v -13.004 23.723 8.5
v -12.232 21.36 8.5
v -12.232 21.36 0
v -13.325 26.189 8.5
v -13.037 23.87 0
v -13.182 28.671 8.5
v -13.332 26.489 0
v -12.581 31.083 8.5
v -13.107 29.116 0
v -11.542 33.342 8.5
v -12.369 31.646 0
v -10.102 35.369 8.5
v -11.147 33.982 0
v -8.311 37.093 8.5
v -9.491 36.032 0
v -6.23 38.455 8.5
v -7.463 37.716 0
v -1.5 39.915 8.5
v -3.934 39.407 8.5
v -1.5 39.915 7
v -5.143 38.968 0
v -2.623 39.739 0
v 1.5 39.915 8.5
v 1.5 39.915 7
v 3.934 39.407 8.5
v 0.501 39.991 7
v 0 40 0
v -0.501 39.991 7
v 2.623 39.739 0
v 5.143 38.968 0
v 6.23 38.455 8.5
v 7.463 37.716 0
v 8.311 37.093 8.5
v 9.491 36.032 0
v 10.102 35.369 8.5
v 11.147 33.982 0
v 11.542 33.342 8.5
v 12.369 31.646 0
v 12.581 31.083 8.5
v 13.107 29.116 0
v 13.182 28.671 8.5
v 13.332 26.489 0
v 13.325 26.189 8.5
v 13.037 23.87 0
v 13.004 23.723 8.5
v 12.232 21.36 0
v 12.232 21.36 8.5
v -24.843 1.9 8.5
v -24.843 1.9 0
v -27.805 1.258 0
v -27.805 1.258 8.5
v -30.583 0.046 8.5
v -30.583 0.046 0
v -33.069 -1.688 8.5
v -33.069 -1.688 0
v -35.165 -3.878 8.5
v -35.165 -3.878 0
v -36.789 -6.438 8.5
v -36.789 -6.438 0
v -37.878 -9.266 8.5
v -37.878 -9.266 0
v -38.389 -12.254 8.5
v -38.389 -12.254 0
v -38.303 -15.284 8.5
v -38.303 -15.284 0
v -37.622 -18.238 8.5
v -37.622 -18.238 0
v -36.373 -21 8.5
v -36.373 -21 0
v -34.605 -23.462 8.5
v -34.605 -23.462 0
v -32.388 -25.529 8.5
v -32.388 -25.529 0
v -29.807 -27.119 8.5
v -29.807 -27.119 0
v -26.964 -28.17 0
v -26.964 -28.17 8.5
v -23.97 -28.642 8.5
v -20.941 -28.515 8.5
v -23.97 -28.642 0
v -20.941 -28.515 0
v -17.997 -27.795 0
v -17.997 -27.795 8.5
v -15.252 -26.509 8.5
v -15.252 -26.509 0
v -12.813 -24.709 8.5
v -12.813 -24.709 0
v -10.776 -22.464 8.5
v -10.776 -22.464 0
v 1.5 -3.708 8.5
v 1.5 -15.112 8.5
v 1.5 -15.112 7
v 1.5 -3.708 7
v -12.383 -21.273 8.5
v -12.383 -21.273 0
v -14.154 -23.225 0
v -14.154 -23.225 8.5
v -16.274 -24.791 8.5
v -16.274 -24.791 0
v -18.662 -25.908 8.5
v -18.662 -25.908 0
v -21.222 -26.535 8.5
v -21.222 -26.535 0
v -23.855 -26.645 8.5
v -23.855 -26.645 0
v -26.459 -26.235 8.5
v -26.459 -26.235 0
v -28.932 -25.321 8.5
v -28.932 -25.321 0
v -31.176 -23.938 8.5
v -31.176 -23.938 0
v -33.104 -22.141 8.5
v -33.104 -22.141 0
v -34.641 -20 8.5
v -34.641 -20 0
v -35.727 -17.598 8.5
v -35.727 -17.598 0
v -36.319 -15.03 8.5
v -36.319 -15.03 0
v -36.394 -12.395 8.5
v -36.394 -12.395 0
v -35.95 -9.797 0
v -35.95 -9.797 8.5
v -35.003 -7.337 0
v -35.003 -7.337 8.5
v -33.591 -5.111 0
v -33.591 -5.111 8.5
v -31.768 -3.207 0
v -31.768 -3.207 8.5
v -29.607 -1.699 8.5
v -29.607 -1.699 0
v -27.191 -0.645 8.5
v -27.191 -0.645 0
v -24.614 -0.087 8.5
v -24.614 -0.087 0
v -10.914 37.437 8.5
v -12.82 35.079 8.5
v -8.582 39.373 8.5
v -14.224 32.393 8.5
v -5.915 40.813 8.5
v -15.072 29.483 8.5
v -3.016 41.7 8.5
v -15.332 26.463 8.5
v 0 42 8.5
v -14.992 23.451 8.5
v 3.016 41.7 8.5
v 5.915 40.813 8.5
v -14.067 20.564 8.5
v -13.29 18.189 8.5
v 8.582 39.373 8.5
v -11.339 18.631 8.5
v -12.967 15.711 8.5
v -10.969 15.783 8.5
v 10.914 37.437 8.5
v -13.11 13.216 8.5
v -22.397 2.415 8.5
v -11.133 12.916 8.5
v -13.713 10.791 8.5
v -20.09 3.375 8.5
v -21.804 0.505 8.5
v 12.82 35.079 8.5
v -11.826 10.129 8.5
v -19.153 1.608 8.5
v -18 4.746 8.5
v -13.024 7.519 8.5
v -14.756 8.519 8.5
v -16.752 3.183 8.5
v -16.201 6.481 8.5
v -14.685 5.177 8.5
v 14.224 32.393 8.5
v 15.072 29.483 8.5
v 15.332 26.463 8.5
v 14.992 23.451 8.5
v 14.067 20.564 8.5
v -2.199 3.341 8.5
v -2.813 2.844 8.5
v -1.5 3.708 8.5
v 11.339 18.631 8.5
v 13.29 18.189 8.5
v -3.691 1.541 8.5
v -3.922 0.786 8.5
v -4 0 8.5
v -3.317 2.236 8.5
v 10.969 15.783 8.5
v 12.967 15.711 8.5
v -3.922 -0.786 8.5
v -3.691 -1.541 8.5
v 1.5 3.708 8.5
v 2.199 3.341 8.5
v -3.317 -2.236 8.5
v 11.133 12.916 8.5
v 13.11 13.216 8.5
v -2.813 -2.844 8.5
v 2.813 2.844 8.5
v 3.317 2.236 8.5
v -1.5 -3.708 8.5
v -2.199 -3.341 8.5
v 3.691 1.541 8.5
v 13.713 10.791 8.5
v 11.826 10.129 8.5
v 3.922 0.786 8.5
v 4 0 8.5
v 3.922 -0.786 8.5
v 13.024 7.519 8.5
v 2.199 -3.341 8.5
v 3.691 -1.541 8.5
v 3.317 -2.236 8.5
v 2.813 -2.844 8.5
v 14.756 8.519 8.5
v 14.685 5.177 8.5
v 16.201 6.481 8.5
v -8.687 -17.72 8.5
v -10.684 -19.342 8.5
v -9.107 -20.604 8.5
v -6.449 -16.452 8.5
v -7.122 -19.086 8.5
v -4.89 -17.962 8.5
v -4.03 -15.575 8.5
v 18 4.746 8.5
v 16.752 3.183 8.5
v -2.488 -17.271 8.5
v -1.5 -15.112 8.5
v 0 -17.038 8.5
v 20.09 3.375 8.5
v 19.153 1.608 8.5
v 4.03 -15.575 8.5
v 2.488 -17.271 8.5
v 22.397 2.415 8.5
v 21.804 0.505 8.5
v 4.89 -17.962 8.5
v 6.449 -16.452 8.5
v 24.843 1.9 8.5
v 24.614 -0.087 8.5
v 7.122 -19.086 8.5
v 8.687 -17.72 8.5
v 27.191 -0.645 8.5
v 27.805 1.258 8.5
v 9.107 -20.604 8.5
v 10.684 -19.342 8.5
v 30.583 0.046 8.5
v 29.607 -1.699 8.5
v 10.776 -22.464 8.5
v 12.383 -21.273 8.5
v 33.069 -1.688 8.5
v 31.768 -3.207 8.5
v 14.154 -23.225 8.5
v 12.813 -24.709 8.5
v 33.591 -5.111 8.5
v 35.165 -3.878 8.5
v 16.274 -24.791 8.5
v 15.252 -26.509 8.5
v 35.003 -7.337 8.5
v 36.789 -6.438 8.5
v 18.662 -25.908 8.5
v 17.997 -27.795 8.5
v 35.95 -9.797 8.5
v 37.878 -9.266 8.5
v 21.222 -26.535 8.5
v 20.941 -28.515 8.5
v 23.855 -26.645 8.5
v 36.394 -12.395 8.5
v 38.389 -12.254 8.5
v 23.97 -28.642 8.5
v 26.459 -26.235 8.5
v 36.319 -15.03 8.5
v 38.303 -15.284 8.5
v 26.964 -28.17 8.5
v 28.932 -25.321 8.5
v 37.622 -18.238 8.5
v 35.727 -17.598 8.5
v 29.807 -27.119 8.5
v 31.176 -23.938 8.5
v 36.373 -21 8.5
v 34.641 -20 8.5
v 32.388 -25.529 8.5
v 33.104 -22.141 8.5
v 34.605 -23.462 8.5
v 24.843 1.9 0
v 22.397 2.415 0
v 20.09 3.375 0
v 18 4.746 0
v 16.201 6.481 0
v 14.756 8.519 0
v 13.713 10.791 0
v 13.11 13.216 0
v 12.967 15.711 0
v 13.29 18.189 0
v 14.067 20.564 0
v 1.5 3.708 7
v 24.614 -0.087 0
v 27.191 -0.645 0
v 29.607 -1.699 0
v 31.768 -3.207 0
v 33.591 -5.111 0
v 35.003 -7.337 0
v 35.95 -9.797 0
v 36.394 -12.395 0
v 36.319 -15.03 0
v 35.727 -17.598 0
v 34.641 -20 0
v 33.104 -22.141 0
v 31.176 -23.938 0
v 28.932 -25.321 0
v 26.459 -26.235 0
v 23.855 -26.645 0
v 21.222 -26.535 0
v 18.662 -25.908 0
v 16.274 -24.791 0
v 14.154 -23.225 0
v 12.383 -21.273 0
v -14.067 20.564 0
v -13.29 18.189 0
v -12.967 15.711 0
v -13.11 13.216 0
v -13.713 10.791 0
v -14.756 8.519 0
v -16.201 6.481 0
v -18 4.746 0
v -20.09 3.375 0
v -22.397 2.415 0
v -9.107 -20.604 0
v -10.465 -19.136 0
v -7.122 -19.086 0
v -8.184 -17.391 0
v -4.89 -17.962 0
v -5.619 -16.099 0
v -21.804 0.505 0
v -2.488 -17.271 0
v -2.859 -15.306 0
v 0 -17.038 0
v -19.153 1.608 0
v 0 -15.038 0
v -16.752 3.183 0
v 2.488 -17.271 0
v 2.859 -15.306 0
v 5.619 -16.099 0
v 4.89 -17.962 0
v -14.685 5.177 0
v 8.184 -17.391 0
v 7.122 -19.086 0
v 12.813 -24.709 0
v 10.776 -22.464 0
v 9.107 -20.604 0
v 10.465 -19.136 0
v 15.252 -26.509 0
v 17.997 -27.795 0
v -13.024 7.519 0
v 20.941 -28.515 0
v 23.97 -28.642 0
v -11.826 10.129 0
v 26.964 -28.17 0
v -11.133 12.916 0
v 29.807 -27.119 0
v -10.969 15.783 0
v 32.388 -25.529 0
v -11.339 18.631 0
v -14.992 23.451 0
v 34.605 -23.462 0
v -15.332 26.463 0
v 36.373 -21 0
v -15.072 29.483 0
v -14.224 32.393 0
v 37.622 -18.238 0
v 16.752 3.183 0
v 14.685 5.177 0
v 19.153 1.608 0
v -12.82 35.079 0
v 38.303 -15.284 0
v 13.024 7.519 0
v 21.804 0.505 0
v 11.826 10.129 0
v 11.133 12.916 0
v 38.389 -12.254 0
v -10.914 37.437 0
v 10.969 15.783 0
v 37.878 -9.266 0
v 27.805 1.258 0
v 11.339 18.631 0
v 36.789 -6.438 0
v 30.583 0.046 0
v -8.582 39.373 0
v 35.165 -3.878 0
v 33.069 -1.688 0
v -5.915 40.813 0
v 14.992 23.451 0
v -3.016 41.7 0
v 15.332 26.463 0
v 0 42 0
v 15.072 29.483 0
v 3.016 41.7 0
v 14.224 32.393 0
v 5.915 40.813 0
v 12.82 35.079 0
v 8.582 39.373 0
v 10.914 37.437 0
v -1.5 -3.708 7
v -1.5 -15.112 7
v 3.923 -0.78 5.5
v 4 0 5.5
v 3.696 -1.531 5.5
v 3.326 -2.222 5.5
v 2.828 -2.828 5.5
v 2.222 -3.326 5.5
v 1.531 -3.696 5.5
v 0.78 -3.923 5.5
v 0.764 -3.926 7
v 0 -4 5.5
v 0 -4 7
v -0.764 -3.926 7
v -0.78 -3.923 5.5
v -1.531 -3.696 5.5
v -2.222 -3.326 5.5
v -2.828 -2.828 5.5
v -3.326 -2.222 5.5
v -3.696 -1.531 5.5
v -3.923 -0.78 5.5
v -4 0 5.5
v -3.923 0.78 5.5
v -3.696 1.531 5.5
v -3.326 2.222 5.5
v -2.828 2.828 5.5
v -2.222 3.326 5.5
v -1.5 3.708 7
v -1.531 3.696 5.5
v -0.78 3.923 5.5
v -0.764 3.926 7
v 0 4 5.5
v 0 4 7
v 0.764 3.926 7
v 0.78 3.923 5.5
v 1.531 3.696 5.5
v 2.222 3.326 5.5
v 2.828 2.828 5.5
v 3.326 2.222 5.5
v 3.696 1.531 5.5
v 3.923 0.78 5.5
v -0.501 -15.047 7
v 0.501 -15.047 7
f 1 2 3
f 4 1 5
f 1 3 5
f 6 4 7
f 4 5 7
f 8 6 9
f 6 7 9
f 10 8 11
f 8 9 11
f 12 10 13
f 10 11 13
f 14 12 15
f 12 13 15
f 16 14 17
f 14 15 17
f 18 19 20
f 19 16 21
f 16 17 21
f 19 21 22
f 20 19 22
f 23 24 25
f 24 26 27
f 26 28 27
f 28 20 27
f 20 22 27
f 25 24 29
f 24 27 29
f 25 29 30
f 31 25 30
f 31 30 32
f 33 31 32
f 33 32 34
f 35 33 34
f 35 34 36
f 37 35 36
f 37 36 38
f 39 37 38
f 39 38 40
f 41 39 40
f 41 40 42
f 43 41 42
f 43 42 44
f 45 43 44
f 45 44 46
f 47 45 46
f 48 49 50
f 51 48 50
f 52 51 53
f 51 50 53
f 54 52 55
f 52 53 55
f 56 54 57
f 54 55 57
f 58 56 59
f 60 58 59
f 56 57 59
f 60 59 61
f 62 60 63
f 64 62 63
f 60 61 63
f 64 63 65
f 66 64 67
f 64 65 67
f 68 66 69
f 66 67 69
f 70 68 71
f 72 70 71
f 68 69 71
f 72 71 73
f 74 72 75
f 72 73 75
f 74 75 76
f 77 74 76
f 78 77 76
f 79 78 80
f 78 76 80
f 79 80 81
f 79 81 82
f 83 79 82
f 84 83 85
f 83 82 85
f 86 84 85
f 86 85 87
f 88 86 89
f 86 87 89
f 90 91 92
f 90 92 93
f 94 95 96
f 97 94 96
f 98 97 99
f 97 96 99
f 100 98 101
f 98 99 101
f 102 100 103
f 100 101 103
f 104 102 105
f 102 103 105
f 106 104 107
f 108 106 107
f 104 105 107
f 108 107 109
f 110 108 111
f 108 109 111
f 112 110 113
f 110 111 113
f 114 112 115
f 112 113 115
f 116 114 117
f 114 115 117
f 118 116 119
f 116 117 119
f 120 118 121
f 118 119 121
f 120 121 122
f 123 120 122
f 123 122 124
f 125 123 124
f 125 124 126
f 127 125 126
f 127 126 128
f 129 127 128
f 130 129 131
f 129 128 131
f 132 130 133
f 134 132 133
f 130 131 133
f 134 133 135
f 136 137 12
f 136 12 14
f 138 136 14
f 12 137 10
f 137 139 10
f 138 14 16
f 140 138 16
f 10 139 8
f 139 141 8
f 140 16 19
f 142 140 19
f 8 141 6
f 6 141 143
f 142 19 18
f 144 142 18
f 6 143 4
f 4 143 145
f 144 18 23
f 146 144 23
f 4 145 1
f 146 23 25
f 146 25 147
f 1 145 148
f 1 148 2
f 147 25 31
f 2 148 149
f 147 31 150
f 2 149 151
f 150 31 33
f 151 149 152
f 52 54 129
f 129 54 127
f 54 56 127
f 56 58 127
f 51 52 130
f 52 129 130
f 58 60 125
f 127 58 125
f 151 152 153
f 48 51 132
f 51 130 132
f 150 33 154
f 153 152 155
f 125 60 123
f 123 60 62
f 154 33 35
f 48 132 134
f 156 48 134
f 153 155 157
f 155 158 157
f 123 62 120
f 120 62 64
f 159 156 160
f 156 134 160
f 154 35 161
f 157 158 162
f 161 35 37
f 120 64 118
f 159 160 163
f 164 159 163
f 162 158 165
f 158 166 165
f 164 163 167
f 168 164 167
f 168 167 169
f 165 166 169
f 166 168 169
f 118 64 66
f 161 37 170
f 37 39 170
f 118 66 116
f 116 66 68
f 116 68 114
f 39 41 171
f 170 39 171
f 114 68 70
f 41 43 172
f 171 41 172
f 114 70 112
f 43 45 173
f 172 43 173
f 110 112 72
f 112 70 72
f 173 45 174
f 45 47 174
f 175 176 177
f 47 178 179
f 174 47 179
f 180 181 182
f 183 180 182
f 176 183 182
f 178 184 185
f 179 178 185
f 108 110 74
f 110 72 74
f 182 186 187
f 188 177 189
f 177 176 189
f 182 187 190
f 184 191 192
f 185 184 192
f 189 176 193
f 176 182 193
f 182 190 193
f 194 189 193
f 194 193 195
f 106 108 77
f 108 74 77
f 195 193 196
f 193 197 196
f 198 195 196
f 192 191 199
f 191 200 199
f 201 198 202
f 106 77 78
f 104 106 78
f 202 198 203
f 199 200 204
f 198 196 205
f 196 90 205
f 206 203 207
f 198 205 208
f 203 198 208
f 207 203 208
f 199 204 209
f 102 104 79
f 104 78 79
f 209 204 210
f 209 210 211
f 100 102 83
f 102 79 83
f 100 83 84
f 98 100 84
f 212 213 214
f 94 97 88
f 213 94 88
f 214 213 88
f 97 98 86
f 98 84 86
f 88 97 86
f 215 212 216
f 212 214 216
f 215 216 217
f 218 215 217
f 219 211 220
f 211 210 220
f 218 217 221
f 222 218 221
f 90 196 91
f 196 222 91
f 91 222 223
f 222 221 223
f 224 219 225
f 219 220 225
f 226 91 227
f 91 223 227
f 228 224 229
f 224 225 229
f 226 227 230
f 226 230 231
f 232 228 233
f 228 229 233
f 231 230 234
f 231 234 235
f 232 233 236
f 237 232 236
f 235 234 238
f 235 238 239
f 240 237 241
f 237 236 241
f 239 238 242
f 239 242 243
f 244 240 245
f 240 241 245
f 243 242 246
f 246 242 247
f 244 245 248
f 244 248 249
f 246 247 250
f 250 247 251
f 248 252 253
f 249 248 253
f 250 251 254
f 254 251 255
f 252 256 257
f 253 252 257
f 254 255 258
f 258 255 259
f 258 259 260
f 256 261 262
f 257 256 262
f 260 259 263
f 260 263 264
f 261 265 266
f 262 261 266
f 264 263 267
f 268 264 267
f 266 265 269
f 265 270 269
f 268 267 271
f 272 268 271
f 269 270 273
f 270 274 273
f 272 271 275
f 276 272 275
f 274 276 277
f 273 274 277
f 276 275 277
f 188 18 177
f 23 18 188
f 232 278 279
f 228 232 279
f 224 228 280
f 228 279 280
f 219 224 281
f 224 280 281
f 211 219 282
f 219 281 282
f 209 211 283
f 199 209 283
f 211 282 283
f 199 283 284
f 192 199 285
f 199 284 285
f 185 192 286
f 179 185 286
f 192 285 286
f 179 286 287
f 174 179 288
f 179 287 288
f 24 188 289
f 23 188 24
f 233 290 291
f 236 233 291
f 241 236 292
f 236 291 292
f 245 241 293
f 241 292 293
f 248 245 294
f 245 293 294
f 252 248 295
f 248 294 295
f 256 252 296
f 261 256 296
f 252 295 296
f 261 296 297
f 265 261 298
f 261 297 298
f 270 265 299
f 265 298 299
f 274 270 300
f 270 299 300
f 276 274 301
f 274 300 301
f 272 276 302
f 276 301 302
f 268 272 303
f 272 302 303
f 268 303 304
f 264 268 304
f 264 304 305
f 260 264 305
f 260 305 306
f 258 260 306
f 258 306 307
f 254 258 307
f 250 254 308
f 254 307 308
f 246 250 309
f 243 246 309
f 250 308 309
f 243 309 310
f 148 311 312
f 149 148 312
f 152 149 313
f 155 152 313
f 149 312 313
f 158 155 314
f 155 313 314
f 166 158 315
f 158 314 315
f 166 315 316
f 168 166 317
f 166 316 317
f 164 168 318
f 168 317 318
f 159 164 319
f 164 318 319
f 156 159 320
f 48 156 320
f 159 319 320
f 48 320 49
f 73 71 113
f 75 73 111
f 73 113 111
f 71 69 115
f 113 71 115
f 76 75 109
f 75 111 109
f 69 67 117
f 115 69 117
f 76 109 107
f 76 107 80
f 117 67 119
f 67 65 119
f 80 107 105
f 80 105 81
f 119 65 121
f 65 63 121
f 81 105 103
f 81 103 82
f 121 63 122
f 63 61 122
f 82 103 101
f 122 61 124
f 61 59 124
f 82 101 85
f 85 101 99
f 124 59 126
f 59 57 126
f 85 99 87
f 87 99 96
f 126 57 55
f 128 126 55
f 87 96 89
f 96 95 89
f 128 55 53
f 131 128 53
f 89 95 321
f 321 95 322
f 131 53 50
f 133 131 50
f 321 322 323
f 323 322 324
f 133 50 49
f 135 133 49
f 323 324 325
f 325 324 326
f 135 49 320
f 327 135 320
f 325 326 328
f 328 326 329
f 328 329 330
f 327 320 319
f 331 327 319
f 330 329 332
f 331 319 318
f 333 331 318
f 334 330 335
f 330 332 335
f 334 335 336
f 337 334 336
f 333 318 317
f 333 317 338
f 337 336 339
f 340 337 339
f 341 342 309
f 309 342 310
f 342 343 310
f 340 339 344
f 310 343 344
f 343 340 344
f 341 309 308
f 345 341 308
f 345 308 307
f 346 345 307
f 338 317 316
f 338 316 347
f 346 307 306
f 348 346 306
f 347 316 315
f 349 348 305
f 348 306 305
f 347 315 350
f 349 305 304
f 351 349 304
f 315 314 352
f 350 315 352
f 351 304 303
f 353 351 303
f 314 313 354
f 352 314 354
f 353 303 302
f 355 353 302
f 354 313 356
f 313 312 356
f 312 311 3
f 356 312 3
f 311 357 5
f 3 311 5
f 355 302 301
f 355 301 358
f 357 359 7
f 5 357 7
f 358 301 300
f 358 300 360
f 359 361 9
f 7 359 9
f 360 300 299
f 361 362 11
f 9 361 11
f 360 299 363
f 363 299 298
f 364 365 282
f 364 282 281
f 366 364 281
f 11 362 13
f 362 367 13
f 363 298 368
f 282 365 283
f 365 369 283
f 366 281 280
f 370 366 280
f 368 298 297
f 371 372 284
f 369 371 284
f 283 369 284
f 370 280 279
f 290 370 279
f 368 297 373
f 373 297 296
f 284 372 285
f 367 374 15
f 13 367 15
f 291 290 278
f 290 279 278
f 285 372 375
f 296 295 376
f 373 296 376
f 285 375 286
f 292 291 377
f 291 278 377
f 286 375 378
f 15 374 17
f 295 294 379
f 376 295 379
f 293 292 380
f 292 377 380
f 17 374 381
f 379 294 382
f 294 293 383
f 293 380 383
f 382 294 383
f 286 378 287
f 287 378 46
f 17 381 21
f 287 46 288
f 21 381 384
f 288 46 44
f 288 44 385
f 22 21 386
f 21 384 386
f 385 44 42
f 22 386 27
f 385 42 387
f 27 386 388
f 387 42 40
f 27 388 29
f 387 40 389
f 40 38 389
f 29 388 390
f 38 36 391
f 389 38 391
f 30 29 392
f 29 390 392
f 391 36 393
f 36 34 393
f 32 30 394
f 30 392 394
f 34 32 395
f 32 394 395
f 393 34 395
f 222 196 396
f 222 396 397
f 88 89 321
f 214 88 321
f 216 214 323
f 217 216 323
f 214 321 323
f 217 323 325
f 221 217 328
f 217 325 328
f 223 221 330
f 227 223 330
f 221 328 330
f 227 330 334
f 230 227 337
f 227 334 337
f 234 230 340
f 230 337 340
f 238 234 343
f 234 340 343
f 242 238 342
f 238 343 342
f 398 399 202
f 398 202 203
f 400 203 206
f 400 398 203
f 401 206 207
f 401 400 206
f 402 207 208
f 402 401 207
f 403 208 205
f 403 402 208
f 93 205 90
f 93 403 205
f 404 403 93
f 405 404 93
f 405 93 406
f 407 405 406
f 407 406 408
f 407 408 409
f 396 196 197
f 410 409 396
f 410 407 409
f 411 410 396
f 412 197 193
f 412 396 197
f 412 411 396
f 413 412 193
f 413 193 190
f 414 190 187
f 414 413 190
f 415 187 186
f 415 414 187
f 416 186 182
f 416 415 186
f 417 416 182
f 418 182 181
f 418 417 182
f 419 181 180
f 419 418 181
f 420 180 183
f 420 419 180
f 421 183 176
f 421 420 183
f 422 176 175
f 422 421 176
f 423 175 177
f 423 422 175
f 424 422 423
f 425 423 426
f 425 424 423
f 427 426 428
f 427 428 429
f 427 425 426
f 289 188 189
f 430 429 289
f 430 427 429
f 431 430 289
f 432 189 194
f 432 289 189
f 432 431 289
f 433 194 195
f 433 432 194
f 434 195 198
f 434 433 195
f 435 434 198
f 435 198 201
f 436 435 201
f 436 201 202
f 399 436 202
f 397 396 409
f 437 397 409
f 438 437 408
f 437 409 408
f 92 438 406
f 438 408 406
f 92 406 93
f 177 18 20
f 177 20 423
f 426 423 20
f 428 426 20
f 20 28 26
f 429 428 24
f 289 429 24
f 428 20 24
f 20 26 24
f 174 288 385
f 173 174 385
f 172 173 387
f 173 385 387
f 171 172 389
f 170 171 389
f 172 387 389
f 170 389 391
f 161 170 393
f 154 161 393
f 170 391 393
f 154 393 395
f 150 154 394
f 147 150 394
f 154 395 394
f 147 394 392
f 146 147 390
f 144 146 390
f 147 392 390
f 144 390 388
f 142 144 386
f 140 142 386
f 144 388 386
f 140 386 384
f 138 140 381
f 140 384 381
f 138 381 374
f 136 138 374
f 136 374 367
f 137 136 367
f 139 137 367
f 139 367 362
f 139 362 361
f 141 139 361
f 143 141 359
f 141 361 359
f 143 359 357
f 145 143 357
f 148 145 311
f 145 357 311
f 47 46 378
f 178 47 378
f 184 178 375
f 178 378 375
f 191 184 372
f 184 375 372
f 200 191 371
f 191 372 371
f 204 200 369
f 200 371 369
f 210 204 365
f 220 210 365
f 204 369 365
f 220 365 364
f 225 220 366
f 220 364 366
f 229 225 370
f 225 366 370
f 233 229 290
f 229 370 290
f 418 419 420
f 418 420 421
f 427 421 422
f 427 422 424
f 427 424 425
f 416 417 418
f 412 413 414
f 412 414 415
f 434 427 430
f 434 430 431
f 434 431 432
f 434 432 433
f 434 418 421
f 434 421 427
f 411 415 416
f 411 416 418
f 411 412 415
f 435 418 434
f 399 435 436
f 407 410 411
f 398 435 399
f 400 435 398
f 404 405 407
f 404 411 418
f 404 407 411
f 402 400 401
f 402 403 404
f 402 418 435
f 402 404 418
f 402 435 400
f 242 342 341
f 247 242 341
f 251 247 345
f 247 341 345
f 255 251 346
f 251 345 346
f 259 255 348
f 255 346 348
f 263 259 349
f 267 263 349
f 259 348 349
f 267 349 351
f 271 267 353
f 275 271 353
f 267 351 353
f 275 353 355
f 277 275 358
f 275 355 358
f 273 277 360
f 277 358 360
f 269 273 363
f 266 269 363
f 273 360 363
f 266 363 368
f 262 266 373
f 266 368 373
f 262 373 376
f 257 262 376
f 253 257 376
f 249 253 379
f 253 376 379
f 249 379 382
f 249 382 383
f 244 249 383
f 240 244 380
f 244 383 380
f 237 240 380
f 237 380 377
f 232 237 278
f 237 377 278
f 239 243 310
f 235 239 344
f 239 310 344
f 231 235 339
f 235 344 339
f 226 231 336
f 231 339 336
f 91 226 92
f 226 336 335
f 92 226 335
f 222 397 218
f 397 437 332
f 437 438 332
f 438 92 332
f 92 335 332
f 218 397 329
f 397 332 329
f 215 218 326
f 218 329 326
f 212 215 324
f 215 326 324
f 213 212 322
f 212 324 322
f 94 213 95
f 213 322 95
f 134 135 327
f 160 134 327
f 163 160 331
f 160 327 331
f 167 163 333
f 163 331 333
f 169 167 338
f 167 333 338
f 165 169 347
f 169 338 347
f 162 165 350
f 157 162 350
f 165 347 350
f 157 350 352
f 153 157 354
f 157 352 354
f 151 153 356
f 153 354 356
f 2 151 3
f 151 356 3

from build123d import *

# Parameters (mm, degrees)
F1_DEPTH = 8.5
F3_DEPTH = 1.5
F4_R     = 4
F5_DEPTH = 1.5


with BuildPart() as f1:
    # F0 (on Top) → F1 (new body)
    with BuildSketch(Plane.XY):
        with BuildLine():
            ThreePointArc((24.8425577786, 1.8999753835), (14.7557370554, 8.519228761), (14.066705838, 20.5642984395))
            ThreePointArc((14.066705838, 20.5642984395), (0, 42), (-14.066705838, 20.5642984395))
            ThreePointArc((-14.066705838, 20.5642984395), (-14.7557370554, 8.519228761), (-24.8425577786, 1.8999753835))
            ThreePointArc((-24.8425577786, 1.8999753835), (-36.3730669589, -21), (-10.7758519407, -22.464273823))
            ThreePointArc((-10.7758519407, -22.464273823), (0, -17.038457522), (10.7758519407, -22.464273823))
            ThreePointArc((10.7758519407, -22.464273823), (36.3730669589, -21), (24.8425577786, 1.8999753835))
        make_face()
        with BuildLine():
            ThreePointArc((-12.23191812, 21.3602595126), (0, 40), (12.23191812, 21.3602595126))
            ThreePointArc((12.23191812, 21.3602595126), (13.0236862478, 7.519228761), (24.6144864293, -0.0869779274))
            ThreePointArc((24.6144864293, -0.0869779274), (34.6410161514, -20), (12.3825683094, -21.2732815852))
            ThreePointArc((12.3825683094, -21.2732815852), (0, -15.038457522), (-12.3825683094, -21.2732815852))
            ThreePointArc((-12.3825683094, -21.2732815852), (-34.6410161514, -20), (-24.6144864293, -0.0869779274))
            ThreePointArc((-24.6144864293, -0.0869779274), (-13.0236862478, 7.519228761), (-12.23191812, 21.3602595126))
        make_face(mode=Mode.SUBTRACT)
    extrude(amount=F1_DEPTH)

    # F2 (on face) → F3 (join)
    with BuildSketch(Plane.XY.offset(8.5)):
        with BuildLine():
            ThreePointArc((1.5, 39.9153563293), (0, 40), (-1.5, 39.9153563293))
            Line((-1.5, 39.9153563293), (-1.5, -15.1116190801))
            ThreePointArc((-1.5, -15.1116190801), (0, -15.038457522), (1.5, -15.1116190801))
            Line((1.5, -15.1116190801), (1.5, 39.9153563293))
        make_face()
    extrude(amount=-F3_DEPTH)

    # F4 (on face) → F5 (join, symmetric)
    with BuildSketch(Plane(origin=(0, 0, 7), x_dir=(1, 0, 0), z_dir=(0, 0, -1))):
        Circle(F4_R)
    extrude(amount=F5_DEPTH, both=True)


solid = f1.part
